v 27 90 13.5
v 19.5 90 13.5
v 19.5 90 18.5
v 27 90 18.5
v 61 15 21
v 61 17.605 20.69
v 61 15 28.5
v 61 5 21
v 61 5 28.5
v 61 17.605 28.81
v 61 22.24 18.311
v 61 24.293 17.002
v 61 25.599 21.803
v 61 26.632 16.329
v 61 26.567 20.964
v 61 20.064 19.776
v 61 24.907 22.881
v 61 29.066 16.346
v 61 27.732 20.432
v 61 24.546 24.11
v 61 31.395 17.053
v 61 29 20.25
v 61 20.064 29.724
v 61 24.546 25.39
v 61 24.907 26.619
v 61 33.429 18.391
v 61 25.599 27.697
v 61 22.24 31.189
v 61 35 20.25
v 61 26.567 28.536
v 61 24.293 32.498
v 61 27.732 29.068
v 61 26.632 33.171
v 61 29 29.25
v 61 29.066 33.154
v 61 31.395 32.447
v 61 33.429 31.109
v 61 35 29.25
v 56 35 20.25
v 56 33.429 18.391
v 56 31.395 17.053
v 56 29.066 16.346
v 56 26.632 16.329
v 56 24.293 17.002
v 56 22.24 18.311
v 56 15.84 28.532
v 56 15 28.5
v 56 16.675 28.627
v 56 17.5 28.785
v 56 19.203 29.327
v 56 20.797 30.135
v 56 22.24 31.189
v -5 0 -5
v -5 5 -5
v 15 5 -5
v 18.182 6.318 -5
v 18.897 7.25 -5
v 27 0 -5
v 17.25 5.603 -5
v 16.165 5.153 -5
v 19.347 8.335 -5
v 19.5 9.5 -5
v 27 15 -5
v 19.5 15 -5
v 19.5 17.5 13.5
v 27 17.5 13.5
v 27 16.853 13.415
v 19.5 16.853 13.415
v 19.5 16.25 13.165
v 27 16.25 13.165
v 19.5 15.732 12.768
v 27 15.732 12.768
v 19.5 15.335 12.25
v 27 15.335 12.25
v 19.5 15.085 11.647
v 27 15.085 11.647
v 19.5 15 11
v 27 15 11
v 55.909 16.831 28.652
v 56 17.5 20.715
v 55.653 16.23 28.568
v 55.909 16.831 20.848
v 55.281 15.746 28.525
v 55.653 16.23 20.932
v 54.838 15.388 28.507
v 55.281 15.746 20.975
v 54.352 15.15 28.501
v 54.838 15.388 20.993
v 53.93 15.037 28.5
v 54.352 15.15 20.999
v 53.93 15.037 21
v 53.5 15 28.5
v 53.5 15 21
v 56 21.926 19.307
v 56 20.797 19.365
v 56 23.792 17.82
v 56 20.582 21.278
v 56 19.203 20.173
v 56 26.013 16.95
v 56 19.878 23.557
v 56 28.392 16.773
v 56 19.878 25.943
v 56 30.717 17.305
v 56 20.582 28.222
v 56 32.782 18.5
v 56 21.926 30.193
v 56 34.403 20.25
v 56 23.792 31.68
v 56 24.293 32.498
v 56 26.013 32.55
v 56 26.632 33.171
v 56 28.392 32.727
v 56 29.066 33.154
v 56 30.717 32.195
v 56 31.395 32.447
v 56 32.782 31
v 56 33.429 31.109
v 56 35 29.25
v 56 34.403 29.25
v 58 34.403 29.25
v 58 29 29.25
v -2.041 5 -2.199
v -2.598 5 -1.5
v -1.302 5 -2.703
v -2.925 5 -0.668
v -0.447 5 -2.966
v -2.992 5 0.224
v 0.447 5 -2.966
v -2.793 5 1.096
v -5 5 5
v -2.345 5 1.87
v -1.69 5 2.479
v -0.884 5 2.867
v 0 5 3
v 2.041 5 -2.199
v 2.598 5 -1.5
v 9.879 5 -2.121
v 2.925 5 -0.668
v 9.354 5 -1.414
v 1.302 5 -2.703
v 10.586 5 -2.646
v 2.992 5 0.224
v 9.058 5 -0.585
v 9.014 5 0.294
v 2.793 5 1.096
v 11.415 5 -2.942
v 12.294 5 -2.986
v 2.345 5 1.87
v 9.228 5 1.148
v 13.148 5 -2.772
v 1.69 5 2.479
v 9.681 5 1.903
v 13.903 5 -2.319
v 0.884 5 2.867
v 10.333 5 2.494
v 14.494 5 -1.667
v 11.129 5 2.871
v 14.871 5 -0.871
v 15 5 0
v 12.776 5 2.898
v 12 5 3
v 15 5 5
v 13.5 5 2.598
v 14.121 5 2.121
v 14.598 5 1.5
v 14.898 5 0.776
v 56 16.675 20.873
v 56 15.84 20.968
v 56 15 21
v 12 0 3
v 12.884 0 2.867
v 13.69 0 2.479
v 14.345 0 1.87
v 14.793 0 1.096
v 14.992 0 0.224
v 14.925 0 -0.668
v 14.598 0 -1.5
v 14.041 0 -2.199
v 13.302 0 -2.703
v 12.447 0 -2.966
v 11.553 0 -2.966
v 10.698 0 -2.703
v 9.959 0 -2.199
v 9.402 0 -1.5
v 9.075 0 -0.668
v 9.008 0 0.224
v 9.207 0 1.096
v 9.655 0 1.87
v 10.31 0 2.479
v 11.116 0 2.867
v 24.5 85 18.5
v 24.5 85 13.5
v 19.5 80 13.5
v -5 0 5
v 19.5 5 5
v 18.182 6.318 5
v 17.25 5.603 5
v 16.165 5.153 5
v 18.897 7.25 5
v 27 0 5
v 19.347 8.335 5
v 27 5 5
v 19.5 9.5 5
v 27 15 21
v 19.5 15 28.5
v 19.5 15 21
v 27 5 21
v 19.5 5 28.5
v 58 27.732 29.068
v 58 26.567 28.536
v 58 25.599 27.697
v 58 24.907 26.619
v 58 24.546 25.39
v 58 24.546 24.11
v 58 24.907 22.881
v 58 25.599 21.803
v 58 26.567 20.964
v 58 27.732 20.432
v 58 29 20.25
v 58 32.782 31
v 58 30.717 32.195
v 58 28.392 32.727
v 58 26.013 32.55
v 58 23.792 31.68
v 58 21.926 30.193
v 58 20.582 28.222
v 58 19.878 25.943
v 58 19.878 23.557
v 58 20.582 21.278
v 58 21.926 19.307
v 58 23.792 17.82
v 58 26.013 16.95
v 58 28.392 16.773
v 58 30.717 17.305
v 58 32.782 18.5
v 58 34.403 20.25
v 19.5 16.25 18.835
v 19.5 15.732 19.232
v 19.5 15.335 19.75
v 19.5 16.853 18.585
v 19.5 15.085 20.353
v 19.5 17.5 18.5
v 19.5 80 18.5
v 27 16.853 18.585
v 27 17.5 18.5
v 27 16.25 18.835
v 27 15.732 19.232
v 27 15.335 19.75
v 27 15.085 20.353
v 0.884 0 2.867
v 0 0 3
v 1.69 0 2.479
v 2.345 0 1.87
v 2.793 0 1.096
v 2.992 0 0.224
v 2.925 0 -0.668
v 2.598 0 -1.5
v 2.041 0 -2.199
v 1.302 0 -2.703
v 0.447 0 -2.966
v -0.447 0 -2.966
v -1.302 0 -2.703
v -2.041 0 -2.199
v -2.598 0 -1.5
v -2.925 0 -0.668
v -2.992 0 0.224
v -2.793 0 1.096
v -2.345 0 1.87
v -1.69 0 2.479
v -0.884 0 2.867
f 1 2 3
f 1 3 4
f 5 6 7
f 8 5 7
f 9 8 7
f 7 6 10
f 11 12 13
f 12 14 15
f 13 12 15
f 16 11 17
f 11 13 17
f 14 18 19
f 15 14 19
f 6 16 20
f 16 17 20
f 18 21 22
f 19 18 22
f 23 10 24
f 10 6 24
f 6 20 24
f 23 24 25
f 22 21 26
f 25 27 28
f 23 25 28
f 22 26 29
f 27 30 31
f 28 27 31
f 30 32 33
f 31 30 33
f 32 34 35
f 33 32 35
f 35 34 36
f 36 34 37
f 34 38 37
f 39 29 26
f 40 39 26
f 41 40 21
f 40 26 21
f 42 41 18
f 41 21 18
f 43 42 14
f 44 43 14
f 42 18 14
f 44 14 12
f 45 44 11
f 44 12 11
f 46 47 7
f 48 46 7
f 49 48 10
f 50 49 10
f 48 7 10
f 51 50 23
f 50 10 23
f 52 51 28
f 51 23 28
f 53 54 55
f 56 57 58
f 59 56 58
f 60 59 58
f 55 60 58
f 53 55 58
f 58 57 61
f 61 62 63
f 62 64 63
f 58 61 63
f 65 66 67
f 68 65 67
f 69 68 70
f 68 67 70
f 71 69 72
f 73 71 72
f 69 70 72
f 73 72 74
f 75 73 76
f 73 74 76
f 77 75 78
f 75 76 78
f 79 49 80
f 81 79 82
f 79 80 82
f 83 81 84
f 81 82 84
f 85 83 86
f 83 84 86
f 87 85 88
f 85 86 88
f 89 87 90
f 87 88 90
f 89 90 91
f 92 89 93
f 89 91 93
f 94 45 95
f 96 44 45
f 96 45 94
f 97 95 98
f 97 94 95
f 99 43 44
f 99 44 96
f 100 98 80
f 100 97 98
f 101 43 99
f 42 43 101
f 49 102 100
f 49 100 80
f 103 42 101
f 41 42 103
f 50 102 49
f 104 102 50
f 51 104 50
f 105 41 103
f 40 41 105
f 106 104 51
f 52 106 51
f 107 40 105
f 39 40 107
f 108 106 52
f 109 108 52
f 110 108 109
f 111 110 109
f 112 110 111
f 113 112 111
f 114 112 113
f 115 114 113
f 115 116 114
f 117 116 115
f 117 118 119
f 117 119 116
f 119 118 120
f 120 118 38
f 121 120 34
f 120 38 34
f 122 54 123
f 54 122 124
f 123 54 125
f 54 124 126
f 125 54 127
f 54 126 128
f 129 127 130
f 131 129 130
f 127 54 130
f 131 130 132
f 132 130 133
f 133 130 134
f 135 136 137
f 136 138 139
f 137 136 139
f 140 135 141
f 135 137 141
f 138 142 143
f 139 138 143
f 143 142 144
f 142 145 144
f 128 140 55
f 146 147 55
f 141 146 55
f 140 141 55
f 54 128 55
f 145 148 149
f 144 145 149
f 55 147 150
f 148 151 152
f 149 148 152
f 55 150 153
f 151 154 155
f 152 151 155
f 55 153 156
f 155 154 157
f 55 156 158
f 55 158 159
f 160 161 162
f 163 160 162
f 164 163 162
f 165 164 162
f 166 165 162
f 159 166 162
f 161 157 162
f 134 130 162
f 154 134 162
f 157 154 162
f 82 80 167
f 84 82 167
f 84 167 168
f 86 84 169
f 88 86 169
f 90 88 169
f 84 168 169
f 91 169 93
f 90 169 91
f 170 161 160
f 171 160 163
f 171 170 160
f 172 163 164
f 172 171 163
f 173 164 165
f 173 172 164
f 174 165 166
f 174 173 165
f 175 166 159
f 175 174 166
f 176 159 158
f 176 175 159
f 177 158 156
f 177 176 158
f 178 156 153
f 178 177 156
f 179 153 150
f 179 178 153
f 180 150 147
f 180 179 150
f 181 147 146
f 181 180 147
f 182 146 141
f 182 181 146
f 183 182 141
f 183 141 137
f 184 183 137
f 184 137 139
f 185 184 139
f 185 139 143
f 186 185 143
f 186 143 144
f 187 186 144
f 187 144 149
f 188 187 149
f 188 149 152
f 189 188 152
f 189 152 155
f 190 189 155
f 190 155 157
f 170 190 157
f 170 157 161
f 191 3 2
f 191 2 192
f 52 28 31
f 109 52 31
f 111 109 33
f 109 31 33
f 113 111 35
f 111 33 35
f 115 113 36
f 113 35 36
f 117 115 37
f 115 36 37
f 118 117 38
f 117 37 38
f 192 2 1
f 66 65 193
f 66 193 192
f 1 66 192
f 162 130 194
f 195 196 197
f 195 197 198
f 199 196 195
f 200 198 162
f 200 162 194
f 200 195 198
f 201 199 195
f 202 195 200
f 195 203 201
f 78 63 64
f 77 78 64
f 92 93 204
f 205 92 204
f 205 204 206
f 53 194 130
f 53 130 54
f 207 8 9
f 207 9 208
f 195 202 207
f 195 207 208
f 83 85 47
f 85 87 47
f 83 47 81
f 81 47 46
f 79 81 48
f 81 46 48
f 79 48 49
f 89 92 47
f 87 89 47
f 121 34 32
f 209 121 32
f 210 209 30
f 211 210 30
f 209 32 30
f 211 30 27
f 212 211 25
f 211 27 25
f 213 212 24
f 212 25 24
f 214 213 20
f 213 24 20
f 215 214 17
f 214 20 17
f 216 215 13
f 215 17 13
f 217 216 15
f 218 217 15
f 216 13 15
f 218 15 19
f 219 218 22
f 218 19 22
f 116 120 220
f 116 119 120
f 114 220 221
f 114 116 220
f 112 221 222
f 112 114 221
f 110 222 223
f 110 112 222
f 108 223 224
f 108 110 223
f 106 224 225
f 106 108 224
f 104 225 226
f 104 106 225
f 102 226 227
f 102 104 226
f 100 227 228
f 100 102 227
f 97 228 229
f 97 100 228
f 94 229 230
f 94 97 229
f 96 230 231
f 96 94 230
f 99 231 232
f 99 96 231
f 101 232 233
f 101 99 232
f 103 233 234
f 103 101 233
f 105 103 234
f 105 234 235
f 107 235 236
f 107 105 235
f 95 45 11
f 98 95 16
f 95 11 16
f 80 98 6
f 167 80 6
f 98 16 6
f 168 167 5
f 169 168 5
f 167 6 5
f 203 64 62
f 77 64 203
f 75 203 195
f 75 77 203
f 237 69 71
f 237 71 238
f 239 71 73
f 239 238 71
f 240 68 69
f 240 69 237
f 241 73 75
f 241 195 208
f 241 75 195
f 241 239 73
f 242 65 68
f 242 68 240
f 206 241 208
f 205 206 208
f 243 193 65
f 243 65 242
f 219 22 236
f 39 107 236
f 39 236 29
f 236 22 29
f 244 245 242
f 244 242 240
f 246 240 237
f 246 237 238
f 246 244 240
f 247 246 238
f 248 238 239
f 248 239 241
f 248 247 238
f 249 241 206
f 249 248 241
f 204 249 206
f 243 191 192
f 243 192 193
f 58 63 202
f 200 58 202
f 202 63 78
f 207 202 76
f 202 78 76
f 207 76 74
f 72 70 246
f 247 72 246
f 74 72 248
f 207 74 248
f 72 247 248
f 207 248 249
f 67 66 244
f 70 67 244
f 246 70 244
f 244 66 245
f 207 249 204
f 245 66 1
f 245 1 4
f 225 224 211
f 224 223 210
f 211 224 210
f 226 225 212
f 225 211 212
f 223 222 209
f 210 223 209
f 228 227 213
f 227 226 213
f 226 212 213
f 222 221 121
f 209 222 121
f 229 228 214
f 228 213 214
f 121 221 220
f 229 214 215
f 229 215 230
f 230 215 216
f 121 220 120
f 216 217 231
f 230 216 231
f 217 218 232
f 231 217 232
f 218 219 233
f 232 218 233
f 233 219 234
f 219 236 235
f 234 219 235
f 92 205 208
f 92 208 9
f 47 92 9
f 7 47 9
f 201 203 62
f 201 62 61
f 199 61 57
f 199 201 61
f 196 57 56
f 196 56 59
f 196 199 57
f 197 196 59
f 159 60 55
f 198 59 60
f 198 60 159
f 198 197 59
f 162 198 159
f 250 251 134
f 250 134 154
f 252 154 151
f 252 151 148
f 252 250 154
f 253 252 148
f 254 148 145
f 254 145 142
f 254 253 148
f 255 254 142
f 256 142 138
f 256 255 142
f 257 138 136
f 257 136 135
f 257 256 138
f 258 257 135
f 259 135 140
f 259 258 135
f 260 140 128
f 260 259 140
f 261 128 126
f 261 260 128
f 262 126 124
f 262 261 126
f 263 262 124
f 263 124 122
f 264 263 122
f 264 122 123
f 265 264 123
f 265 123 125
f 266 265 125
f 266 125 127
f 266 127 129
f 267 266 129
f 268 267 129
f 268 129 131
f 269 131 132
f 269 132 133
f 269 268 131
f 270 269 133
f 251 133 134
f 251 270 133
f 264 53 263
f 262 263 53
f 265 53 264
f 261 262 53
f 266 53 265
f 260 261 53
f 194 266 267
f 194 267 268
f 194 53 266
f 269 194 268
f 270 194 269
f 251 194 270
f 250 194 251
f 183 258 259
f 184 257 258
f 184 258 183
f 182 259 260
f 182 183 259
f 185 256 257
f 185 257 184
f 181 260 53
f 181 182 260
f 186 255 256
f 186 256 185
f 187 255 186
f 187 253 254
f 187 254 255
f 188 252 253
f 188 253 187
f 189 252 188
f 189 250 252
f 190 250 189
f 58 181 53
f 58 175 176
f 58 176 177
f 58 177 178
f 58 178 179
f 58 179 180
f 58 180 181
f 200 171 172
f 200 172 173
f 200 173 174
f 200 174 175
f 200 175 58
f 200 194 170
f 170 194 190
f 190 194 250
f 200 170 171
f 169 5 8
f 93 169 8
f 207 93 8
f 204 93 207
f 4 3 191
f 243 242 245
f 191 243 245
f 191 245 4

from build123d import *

# Parameters (mm, degrees)
SKETCH2_W                            = 22
SKETCH2_H                            = 10
SKETCH2_R                            = 3
BOSS_EXTRUDE1_DEPTH                  = 5
SKETCH3_W                            = 10
SKETCH3_H                            = 5
BOSS_EXTRUDE2_DEPTH                  = 10
BOSS_EXTRUDE3_DEPTH                  = 10
SKETCH5_W                            = 7.5
SKETCH5_H                            = 5
BOSS_EXTRUDE4_DEPTH                  = 75
CUT_EXTRUDE1_REACH                   = 98.857
BOSS_EXTRUDE5_DEPTH                  = 10
SKETCH13_W                           = 5
SKETCH13_H                           = 10
BOSS_EXTRUDE6_DEPTH                  = 7.5
BOSS_EXTRUDE7_DEPTH                  = 5
CUT_EXTRUDE5_REACH                   = 118.454
SKETCH16_R                           = 8
CUT_EXTRUDE6_DEPTH                   = 2
BOSS_EXTRUDE8_REACH                  = 104.314
BOSS_EXTRUDE8_END_RADIUS             = 11.091410312
BOSS_EXTRUDE8_DIRECTION_2_REACH      = 104.314
BOSS_EXTRUDE8_DIRECTION_2_END_RADIUS = 11.091410312
BOSS_EXTRUDE9_DEPTH                  = 7.5
BOSS_EXTRUDE10_START                 = -10
BOSS_EXTRUDE10_DEPTH                 = 10


with BuildPart() as part:
    # Sketch2 → Boss-Extrude1 (new body)
    with BuildSketch(Plane(origin=(0, 0, 0), x_dir=(1, 0, 0), z_dir=(0, 1, 0))):
        with Locations((6, 0)):
            Rectangle(SKETCH2_W, SKETCH2_H)
        with Locations(Location((0, 0, 0), (0, 0, 270))):
            Circle(SKETCH2_R, mode=Mode.SUBTRACT)
        with Locations(Location((12, 0, 0), (0, 0, 270))):
            Circle(SKETCH2_R, mode=Mode.SUBTRACT)
    extrude(amount=BOSS_EXTRUDE1_DEPTH)

    # Sketch3 → Boss-Extrude2 (add)
    with BuildSketch(Plane.XY.offset(5)):
        with Locations((22, 2.5)):
            Rectangle(SKETCH3_W, SKETCH3_H)
    extrude(amount=-BOSS_EXTRUDE2_DEPTH)

    # Sketch4 → Boss-Extrude3 (add)
    with BuildSketch(Plane(origin=(0, 5, 0), x_dir=(1, 0, 0), z_dir=(0, 1, 0))):
        Polygon((27, 5), (27, -5), (27, -7.5), (27, -18.5), (19.5, -18.5), (19.5, -7.5), (19.5, 5), align=None)
    extrude(amount=BOSS_EXTRUDE3_DEPTH)

    # Sketch5 → Boss-Extrude4 (add)
    with BuildSketch(Plane(origin=(0, 15, 0), x_dir=(1, 0, 0), z_dir=(0, 1, 0))):
        with Locations((23.25, -16)):
            Rectangle(SKETCH5_W, SKETCH5_H)
    extrude(amount=BOSS_EXTRUDE4_DEPTH)

    # Sketch6 → Cut-Extrude1 (cut, up to next)
    with BuildSketch(Plane.XY.offset(18.5), mode=Mode.PRIVATE) as cut_extrude1_sk1:
        Polygon((19.5, 90), (24.5, 85), (19.5, 80), align=None)
    cut_extrude1_tool1 = extrude(cut_extrude1_sk1.sketch, amount=-CUT_EXTRUDE1_REACH, mode=Mode.PRIVATE) & part.part
    add(cut_extrude1_tool1.solids().sort_by_distance((21.166667, 85, 18.5))[0], mode=Mode.SUBTRACT)

    # Sketch7 → Boss-Extrude5 (add)
    with BuildSketch(Plane(origin=(0, 15, 0), x_dir=(1, 0, 0), z_dir=(0, 1, 0))):
        Polygon((19.5, 5), (19.5, -28.5), (56, -28.5), (56, -21), (27, -21), (27, 5), align=None)
    extrude(amount=-BOSS_EXTRUDE5_DEPTH)

    # Sketch13 → Boss-Extrude6 (add)
    with BuildSketch(Plane(origin=(0, 0, 21), x_dir=(-1, 0, 0), z_dir=(0, 0, -1))):
        with Locations((-58.5, 10)):
            Rectangle(SKETCH13_W, SKETCH13_H)
    extrude(amount=-BOSS_EXTRUDE6_DEPTH)

    # Sketch14 → Boss-Extrude7 (add)
    with BuildSketch(Plane(origin=(61, 0, 0), x_dir=(0, 0, -1), z_dir=(1, 0, 0))):
        with BuildLine():
            Line((-29.25, 35), (-20.25, 35))
            ThreePointArc((-20.25, 35), (-16.346490099, 29.066011911), (-18.310852147, 22.240260236))
            ThreePointArc((-18.310852147, 22.240260236), (-20.306000981, 18.86176399), (-21, 15))
            Line((-21, 15), (-28.5, 15))
            ThreePointArc((-28.5, 15), (-29.193999019, 18.86176399), (-31.189147853, 22.240260236))
            ThreePointArc((-31.189147853, 22.240260236), (-33.153509901, 29.066011911), (-29.25, 35))
        make_face()
    extrude(amount=-BOSS_EXTRUDE7_DEPTH)

    # Sketch15 → Cut-Extrude5 (cut, up to next)
    with BuildSketch(Plane(origin=(61, 0, 0), x_dir=(0, 0, -1), z_dir=(1, 0, 0)), mode=Mode.PRIVATE) as cut_extrude5_sk1:
        with BuildLine():
            Line((-29.25, 35), (-29.25, 29))
            ThreePointArc((-29.25, 29), (-24.75, 24.5), (-20.25, 29))
            Line((-20.25, 29), (-20.25, 35))
            Line((-20.25, 35), (-29.25, 35))
        make_face()
    cut_extrude5_tool1 = extrude(cut_extrude5_sk1.sketch, amount=-CUT_EXTRUDE5_REACH, mode=Mode.PRIVATE) & part.part
    add(cut_extrude5_tool1.solids().sort_by_distance((61, 30.179951, 24.75))[0], mode=Mode.SUBTRACT)

    # Sketch16 → Cut-Extrude6 (cut)
    with BuildSketch(Plane(origin=(56, 0, 0), x_dir=(0, 0, -1), z_dir=(1, 0, 0))):
        with Locations((-24.75, 27.788897449)):
            Circle(SKETCH16_R)
    extrude(amount=CUT_EXTRUDE6_DEPTH, mode=Mode.SUBTRACT)

    # Boss-Extrude8: up to this cylinder (the profile starts outside it)
    boss_extrude8_end = Plane(origin=(55.44158, 15, 9.908589688), z_dir=(1, 0, 0)) * Cylinder(BOSS_EXTRUDE8_END_RADIUS, 231.810820624, mode=Mode.PRIVATE)
    # Sketch17 → Boss-Extrude8 (add, up to the surface)
    with BuildSketch(Plane(origin=(56, 15, 28.5), x_dir=(-1, 0, 0), z_dir=(0, 0, -1)), mode=Mode.PRIVATE) as boss_extrude8_sk1:
        with BuildLine():
            Line((0, 0), (0, 2.5))
            ThreePointArc((0, 2.5), (0.732233047, 0.732233047), (2.5, 0))
            Line((2.5, 0), (0, 0))
        make_face()
    boss_extrude8_tool1 = extrude(boss_extrude8_sk1.sketch, amount=BOSS_EXTRUDE8_REACH, mode=Mode.PRIVATE) - boss_extrude8_end
    add(boss_extrude8_tool1.solids().sort_by_distance((55.44158, 15.55842, 28.5))[0])

    # Boss-Extrude8 direction 2: up to this cylinder (the profile starts outside it)
    boss_extrude8_direction_2_end = Plane(origin=(55.44158, 15, 39.591410312), z_dir=(1, 0, 0)) * Cylinder(BOSS_EXTRUDE8_DIRECTION_2_END_RADIUS, 231.810820624, mode=Mode.PRIVATE)
    # Sketch17 → Boss-Extrude8 direction 2 (add, up to the surface)
    with BuildSketch(Plane(origin=(56, 15, 28.5), x_dir=(-1, 0, 0), z_dir=(0, 0, -1)), mode=Mode.PRIVATE) as boss_extrude8_direction_2_sk1:
        with BuildLine():
            Line((0, 0), (0, 2.5))
            ThreePointArc((0, 2.5), (0.732233047, 0.732233047), (2.5, 0))
            Line((2.5, 0), (0, 0))
        make_face()
    boss_extrude8_direction_2_tool1 = extrude(boss_extrude8_direction_2_sk1.sketch, amount=-BOSS_EXTRUDE8_DIRECTION_2_REACH, mode=Mode.PRIVATE) - boss_extrude8_direction_2_end
    add(boss_extrude8_direction_2_tool1.solids().sort_by_distance((55.44158, 15.55842, 28.5))[0])

    # Sketch18 → Boss-Extrude9 (add)
    with BuildSketch(Plane(origin=(27, 0, 0), x_dir=(0, 0, -1), z_dir=(1, 0, 0))):
        with BuildLine():
            Line((-13.5, 15), (-13.5, 17.5))
            ThreePointArc((-13.5, 17.5), (-12.767766953, 15.732233047), (-11, 15))
            Line((-11, 15), (-13.5, 15))
        make_face()
        with BuildLine():
            Line((-18.5, 15), (-18.5, 17.5))
            ThreePointArc((-18.5, 17.5), (-19.232233047, 15.732233047), (-21, 15))
            Line((-21, 15), (-18.5, 15))
        make_face()
    extrude(amount=-BOSS_EXTRUDE9_DEPTH)

    # Sketch19 → Boss-Extrude10 (add)
    with BuildSketch(Plane(origin=(0, 0, -5), x_dir=(-1, 0, 0), z_dir=(0, 0, -1)).offset(BOSS_EXTRUDE10_START)):
        with BuildLine():
            Line((-19.5, 5), (-19.5, 9.5))
            ThreePointArc((-19.5, 9.5), (-18.181980515, 6.318019485), (-15, 5))
            Line((-15, 5), (-19.5, 5))
        make_face()
    extrude(amount=BOSS_EXTRUDE10_DEPTH)


solid = part.part
